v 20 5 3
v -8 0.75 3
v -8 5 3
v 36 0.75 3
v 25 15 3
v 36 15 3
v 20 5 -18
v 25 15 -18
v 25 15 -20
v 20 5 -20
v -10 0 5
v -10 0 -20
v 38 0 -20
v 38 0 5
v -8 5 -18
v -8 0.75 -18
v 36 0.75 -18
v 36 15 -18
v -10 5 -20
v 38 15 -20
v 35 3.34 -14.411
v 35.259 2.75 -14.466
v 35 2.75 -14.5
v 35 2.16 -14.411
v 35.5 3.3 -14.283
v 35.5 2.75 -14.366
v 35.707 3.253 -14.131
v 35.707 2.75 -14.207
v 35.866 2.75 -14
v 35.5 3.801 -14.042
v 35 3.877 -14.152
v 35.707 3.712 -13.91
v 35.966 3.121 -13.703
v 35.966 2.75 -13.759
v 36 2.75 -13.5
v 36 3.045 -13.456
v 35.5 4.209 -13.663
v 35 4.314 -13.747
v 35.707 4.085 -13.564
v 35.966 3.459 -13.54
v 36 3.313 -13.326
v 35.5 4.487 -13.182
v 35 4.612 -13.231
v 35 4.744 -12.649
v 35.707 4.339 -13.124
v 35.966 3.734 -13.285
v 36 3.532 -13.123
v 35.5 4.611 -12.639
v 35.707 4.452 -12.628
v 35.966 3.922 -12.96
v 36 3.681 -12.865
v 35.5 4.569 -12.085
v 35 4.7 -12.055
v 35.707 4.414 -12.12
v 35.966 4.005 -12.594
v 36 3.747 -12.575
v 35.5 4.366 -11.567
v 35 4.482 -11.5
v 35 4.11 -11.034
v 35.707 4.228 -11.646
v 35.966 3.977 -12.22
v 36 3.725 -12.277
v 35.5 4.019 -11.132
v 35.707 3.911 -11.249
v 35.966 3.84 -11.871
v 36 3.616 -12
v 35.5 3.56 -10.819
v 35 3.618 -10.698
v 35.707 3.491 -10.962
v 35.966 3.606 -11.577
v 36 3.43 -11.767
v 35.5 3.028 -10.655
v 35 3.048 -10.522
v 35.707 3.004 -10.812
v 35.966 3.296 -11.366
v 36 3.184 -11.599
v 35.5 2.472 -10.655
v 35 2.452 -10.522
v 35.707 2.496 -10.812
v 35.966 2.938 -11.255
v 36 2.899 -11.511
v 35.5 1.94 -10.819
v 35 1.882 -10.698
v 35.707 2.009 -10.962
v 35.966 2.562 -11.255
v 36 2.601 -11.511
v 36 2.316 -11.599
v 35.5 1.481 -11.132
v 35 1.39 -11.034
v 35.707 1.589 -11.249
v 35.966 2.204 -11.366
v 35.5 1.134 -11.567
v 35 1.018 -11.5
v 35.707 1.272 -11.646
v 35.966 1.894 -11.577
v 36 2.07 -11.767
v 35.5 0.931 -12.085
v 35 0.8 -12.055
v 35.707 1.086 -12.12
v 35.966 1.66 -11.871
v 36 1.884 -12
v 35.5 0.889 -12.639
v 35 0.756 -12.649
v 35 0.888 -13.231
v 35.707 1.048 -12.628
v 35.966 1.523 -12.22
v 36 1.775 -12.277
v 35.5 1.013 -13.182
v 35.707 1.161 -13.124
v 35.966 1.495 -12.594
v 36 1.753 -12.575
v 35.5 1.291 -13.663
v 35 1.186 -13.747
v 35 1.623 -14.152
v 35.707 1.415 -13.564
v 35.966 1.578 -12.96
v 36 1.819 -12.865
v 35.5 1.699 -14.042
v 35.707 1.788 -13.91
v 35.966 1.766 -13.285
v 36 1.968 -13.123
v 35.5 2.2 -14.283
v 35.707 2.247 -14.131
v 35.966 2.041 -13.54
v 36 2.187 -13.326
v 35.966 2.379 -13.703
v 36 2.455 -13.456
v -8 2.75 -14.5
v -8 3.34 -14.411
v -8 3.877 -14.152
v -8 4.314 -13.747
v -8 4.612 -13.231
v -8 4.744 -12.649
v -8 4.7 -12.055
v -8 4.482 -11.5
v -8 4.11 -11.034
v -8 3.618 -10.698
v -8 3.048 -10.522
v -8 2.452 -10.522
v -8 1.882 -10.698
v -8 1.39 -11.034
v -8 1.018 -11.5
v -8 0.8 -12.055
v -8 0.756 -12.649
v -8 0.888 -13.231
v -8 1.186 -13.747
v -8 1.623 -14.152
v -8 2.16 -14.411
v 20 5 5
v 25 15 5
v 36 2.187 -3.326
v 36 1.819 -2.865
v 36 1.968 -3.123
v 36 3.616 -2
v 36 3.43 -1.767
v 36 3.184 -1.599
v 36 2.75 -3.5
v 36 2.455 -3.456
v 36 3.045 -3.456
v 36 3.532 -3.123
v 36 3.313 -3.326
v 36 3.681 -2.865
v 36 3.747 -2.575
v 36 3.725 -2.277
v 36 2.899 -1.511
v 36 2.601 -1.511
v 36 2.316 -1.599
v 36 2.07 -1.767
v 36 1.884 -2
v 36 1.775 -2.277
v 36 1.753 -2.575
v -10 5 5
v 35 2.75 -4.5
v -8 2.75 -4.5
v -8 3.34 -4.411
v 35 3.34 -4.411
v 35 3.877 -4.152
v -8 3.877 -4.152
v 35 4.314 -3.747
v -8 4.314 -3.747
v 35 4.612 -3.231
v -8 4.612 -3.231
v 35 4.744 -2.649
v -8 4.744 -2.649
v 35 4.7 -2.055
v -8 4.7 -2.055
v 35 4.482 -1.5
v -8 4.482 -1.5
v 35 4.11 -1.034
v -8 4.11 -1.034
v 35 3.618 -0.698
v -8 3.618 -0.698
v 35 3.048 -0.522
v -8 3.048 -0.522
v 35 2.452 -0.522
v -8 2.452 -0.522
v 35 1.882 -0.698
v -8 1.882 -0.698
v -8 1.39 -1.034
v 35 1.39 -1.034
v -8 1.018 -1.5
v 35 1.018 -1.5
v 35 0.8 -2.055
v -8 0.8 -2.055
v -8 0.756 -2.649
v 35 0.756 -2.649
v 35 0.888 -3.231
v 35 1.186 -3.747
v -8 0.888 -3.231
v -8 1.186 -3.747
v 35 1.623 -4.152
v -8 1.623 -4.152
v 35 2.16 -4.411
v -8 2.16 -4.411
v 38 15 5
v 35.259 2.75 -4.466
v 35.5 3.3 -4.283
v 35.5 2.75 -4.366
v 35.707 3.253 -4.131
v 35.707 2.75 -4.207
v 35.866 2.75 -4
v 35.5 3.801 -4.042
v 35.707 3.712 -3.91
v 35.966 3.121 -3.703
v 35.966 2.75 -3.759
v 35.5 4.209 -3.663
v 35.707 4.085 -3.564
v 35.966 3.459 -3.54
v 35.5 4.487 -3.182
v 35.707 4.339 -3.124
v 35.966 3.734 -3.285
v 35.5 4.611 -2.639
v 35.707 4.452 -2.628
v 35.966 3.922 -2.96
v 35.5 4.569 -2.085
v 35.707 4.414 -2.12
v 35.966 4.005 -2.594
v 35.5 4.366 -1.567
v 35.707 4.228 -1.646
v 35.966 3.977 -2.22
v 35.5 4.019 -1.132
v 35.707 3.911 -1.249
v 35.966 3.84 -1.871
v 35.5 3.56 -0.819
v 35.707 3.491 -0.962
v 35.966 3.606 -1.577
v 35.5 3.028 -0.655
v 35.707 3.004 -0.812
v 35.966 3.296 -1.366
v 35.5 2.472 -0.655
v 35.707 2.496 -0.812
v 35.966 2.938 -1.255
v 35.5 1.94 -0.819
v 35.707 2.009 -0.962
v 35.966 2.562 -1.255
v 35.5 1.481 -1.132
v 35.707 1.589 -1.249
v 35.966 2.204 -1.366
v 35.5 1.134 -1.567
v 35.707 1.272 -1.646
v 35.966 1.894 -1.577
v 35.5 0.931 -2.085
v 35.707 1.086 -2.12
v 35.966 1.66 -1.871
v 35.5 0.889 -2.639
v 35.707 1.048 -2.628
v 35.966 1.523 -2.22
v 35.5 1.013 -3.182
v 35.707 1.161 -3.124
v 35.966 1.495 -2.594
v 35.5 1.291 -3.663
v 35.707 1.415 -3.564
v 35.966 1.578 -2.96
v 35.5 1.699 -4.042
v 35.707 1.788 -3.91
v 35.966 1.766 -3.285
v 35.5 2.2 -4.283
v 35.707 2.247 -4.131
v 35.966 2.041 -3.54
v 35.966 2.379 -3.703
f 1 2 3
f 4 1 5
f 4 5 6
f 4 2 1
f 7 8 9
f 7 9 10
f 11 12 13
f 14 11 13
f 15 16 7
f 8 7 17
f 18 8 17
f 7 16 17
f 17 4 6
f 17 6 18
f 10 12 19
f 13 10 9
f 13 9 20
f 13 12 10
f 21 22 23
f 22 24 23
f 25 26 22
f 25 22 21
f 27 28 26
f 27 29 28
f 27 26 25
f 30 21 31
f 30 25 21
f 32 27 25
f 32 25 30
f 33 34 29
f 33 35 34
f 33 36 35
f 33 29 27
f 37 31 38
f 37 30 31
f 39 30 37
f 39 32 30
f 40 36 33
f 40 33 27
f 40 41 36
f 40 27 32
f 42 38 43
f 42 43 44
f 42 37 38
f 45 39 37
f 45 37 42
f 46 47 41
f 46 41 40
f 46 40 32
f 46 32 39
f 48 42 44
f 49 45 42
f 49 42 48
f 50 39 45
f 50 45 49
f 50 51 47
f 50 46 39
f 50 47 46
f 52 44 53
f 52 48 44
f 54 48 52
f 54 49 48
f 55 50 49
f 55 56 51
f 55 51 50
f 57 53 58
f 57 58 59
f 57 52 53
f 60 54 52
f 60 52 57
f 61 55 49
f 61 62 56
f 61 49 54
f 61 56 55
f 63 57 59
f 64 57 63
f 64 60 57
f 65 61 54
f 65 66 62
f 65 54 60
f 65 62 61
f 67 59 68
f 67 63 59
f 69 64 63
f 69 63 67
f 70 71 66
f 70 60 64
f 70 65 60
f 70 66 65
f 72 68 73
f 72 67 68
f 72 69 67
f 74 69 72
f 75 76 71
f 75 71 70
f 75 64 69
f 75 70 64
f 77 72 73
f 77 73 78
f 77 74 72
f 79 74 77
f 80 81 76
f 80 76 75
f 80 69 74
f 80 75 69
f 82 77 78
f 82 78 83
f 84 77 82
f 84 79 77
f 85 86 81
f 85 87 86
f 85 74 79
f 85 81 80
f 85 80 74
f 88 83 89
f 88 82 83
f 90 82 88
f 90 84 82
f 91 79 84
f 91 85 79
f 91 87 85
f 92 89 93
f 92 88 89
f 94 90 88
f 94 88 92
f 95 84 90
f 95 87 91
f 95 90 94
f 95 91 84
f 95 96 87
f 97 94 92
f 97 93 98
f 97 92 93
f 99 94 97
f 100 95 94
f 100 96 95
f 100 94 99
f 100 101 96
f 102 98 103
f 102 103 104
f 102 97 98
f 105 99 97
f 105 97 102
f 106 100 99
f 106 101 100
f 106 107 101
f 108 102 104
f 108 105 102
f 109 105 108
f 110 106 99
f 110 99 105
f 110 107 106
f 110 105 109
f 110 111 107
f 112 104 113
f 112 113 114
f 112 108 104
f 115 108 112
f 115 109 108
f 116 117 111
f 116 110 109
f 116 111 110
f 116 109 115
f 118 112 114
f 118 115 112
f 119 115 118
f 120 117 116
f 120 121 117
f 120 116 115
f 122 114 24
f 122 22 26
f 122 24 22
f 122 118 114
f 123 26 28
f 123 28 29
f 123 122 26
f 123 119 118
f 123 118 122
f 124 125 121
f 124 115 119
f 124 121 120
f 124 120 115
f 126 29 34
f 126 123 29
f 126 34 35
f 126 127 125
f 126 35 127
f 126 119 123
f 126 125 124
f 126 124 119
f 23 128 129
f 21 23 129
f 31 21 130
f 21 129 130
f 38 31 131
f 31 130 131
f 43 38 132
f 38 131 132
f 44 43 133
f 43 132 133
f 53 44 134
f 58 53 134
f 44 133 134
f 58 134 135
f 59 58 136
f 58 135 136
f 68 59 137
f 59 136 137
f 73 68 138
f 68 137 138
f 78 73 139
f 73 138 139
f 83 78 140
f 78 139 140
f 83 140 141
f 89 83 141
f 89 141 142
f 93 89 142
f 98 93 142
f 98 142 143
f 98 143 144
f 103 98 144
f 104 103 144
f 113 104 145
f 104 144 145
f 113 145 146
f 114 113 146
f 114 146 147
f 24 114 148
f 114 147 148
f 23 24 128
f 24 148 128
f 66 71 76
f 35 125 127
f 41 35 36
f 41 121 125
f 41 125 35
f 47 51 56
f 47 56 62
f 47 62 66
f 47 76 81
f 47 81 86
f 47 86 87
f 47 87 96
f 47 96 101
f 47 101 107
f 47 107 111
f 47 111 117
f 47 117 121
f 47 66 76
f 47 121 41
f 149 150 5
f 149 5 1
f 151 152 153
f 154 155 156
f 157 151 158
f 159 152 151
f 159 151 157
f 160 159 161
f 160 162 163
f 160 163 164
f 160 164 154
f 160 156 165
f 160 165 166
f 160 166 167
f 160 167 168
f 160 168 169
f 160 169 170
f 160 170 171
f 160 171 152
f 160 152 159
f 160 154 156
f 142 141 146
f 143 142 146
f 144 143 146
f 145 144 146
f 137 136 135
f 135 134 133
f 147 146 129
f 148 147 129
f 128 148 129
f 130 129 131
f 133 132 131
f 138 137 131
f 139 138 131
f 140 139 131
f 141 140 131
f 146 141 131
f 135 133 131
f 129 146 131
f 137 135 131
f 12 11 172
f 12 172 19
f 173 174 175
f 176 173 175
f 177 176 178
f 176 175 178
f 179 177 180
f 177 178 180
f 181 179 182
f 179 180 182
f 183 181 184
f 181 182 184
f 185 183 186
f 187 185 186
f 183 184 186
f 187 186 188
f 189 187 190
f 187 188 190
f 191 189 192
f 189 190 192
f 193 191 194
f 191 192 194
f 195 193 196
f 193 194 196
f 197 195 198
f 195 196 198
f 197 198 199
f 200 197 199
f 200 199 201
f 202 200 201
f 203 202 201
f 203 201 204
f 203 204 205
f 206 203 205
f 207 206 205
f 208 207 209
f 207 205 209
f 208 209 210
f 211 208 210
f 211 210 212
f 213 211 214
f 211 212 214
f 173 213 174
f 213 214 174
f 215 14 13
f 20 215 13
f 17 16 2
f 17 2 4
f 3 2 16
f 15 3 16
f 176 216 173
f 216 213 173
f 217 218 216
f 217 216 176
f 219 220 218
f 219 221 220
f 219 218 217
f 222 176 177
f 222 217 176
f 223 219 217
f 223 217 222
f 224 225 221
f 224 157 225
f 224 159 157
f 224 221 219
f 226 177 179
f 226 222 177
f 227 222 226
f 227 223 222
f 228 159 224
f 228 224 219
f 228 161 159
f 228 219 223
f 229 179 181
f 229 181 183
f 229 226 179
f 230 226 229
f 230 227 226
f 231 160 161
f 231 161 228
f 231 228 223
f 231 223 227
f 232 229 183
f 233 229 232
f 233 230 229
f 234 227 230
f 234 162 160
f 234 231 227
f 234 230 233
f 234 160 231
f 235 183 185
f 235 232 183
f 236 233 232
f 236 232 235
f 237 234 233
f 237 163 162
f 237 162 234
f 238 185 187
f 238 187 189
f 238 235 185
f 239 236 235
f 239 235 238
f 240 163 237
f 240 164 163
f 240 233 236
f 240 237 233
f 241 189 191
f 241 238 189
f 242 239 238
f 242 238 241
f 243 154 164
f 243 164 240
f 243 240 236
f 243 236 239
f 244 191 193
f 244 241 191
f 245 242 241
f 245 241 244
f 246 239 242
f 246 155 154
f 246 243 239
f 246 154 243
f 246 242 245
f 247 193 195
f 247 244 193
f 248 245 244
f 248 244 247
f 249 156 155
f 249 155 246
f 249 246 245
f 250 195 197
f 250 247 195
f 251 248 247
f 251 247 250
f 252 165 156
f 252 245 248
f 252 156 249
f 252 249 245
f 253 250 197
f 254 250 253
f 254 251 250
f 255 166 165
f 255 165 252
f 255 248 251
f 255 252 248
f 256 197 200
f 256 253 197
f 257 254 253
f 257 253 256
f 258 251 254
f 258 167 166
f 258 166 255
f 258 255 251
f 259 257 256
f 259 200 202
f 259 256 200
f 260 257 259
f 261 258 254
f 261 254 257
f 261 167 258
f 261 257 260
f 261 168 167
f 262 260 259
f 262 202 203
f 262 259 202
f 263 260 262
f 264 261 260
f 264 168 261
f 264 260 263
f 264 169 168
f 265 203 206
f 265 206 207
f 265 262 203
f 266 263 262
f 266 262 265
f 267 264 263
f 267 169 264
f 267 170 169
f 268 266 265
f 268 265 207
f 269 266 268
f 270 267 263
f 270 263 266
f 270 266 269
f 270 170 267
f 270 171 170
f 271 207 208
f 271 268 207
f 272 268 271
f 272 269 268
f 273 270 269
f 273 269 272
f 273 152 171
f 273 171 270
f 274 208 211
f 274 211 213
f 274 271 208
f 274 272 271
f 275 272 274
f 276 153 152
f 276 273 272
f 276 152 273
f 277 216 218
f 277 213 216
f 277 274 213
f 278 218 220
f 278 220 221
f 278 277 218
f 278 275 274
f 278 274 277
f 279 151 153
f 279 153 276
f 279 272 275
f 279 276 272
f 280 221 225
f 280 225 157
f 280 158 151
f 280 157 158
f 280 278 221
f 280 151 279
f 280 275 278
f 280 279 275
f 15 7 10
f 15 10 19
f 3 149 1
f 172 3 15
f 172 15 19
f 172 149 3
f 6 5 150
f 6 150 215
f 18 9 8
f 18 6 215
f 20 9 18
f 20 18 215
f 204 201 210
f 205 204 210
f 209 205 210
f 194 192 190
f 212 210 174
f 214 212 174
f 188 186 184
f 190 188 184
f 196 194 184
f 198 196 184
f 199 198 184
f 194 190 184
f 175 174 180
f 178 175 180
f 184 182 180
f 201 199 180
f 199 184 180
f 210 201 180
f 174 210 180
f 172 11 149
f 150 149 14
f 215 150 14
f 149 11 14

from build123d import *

# Parameters (mm, degrees)
SKETCH1_W             = 48
SKETCH1_H             = 25
BOSS_EXTRUDE1_DEPTH   = 15
CUT_EXTRUDE1_DEPTH    = 26
SKETCH4_W             = 44
SKETCH4_H             = 21
CUT_EXTRUDE2_DEPTH    = 15.25
SKETCH5_R             = 2
BOSS_EXTRUDE4_DEPTH   = 44
BOSS_EXTRUDE4_2_DEPTH = 44
FILLET1_R             = 1
FILLET3_R             = 1


with BuildPart() as part:
    # Sketch1 → Boss-Extrude1 (new body)
    with BuildSketch(Plane(origin=(0, 0, 0), x_dir=(1, 0, 0), z_dir=(0, 1, 0))):
        with Locations((14, 7.5)):
            Rectangle(SKETCH1_W, SKETCH1_H)
    extrude(amount=BOSS_EXTRUDE1_DEPTH)

    # Sketch2 → Cut-Extrude1 (cut, through all)
    with BuildSketch(Plane.XY.offset(5)):
        Polygon((25, 15), (20, 5), (-10, 5), (-10, 15), align=None)
    extrude(amount=-CUT_EXTRUDE1_DEPTH, mode=Mode.SUBTRACT)

    # Sketch4 → Cut-Extrude2 (cut, through all)
    with BuildSketch(Plane(origin=(0, 0.75, 0), x_dir=(1, 0, 0), z_dir=(0, 1, 0))):
        with Locations((14, 7.5)):
            Rectangle(SKETCH4_W, SKETCH4_H)
    extrude(amount=CUT_EXTRUDE2_DEPTH, mode=Mode.SUBTRACT)


with BuildPart() as body_2:
    # Sketch5 → Boss-Extrude4 (new body)
    with BuildSketch(Plane(origin=(-8, 0, 0), x_dir=(0, 0, -1), z_dir=(1, 0, 0))):
        with Locations((12.5, 2.75)):
            Circle(SKETCH5_R)
    extrude(amount=BOSS_EXTRUDE4_DEPTH)

    # Fillet1
    fillet1_edges = [body_2.edges().sort_by_distance(p)[0] for p in [
        (36, 2.75, -10.5),
    ]]
    fillet(fillet1_edges, radius=FILLET1_R)


with BuildPart() as body_3:
    # Sketch5 → Boss-Extrude4 2 (new body)
    with BuildSketch(Plane(origin=(-8, 0, 0), x_dir=(0, 0, -1), z_dir=(1, 0, 0))):
        with Locations((2.5, 2.75)):
            Circle(SKETCH5_R)
    extrude(amount=BOSS_EXTRUDE4_2_DEPTH)

    # Fillet3
    fillet3_edges = [body_3.edges().sort_by_distance(p)[0] for p in [
        (36, 2.75, -0.5),
    ]]
    fillet(fillet3_edges, radius=FILLET3_R)


solid = Compound([part.part, body_2.part, body_3.part])
